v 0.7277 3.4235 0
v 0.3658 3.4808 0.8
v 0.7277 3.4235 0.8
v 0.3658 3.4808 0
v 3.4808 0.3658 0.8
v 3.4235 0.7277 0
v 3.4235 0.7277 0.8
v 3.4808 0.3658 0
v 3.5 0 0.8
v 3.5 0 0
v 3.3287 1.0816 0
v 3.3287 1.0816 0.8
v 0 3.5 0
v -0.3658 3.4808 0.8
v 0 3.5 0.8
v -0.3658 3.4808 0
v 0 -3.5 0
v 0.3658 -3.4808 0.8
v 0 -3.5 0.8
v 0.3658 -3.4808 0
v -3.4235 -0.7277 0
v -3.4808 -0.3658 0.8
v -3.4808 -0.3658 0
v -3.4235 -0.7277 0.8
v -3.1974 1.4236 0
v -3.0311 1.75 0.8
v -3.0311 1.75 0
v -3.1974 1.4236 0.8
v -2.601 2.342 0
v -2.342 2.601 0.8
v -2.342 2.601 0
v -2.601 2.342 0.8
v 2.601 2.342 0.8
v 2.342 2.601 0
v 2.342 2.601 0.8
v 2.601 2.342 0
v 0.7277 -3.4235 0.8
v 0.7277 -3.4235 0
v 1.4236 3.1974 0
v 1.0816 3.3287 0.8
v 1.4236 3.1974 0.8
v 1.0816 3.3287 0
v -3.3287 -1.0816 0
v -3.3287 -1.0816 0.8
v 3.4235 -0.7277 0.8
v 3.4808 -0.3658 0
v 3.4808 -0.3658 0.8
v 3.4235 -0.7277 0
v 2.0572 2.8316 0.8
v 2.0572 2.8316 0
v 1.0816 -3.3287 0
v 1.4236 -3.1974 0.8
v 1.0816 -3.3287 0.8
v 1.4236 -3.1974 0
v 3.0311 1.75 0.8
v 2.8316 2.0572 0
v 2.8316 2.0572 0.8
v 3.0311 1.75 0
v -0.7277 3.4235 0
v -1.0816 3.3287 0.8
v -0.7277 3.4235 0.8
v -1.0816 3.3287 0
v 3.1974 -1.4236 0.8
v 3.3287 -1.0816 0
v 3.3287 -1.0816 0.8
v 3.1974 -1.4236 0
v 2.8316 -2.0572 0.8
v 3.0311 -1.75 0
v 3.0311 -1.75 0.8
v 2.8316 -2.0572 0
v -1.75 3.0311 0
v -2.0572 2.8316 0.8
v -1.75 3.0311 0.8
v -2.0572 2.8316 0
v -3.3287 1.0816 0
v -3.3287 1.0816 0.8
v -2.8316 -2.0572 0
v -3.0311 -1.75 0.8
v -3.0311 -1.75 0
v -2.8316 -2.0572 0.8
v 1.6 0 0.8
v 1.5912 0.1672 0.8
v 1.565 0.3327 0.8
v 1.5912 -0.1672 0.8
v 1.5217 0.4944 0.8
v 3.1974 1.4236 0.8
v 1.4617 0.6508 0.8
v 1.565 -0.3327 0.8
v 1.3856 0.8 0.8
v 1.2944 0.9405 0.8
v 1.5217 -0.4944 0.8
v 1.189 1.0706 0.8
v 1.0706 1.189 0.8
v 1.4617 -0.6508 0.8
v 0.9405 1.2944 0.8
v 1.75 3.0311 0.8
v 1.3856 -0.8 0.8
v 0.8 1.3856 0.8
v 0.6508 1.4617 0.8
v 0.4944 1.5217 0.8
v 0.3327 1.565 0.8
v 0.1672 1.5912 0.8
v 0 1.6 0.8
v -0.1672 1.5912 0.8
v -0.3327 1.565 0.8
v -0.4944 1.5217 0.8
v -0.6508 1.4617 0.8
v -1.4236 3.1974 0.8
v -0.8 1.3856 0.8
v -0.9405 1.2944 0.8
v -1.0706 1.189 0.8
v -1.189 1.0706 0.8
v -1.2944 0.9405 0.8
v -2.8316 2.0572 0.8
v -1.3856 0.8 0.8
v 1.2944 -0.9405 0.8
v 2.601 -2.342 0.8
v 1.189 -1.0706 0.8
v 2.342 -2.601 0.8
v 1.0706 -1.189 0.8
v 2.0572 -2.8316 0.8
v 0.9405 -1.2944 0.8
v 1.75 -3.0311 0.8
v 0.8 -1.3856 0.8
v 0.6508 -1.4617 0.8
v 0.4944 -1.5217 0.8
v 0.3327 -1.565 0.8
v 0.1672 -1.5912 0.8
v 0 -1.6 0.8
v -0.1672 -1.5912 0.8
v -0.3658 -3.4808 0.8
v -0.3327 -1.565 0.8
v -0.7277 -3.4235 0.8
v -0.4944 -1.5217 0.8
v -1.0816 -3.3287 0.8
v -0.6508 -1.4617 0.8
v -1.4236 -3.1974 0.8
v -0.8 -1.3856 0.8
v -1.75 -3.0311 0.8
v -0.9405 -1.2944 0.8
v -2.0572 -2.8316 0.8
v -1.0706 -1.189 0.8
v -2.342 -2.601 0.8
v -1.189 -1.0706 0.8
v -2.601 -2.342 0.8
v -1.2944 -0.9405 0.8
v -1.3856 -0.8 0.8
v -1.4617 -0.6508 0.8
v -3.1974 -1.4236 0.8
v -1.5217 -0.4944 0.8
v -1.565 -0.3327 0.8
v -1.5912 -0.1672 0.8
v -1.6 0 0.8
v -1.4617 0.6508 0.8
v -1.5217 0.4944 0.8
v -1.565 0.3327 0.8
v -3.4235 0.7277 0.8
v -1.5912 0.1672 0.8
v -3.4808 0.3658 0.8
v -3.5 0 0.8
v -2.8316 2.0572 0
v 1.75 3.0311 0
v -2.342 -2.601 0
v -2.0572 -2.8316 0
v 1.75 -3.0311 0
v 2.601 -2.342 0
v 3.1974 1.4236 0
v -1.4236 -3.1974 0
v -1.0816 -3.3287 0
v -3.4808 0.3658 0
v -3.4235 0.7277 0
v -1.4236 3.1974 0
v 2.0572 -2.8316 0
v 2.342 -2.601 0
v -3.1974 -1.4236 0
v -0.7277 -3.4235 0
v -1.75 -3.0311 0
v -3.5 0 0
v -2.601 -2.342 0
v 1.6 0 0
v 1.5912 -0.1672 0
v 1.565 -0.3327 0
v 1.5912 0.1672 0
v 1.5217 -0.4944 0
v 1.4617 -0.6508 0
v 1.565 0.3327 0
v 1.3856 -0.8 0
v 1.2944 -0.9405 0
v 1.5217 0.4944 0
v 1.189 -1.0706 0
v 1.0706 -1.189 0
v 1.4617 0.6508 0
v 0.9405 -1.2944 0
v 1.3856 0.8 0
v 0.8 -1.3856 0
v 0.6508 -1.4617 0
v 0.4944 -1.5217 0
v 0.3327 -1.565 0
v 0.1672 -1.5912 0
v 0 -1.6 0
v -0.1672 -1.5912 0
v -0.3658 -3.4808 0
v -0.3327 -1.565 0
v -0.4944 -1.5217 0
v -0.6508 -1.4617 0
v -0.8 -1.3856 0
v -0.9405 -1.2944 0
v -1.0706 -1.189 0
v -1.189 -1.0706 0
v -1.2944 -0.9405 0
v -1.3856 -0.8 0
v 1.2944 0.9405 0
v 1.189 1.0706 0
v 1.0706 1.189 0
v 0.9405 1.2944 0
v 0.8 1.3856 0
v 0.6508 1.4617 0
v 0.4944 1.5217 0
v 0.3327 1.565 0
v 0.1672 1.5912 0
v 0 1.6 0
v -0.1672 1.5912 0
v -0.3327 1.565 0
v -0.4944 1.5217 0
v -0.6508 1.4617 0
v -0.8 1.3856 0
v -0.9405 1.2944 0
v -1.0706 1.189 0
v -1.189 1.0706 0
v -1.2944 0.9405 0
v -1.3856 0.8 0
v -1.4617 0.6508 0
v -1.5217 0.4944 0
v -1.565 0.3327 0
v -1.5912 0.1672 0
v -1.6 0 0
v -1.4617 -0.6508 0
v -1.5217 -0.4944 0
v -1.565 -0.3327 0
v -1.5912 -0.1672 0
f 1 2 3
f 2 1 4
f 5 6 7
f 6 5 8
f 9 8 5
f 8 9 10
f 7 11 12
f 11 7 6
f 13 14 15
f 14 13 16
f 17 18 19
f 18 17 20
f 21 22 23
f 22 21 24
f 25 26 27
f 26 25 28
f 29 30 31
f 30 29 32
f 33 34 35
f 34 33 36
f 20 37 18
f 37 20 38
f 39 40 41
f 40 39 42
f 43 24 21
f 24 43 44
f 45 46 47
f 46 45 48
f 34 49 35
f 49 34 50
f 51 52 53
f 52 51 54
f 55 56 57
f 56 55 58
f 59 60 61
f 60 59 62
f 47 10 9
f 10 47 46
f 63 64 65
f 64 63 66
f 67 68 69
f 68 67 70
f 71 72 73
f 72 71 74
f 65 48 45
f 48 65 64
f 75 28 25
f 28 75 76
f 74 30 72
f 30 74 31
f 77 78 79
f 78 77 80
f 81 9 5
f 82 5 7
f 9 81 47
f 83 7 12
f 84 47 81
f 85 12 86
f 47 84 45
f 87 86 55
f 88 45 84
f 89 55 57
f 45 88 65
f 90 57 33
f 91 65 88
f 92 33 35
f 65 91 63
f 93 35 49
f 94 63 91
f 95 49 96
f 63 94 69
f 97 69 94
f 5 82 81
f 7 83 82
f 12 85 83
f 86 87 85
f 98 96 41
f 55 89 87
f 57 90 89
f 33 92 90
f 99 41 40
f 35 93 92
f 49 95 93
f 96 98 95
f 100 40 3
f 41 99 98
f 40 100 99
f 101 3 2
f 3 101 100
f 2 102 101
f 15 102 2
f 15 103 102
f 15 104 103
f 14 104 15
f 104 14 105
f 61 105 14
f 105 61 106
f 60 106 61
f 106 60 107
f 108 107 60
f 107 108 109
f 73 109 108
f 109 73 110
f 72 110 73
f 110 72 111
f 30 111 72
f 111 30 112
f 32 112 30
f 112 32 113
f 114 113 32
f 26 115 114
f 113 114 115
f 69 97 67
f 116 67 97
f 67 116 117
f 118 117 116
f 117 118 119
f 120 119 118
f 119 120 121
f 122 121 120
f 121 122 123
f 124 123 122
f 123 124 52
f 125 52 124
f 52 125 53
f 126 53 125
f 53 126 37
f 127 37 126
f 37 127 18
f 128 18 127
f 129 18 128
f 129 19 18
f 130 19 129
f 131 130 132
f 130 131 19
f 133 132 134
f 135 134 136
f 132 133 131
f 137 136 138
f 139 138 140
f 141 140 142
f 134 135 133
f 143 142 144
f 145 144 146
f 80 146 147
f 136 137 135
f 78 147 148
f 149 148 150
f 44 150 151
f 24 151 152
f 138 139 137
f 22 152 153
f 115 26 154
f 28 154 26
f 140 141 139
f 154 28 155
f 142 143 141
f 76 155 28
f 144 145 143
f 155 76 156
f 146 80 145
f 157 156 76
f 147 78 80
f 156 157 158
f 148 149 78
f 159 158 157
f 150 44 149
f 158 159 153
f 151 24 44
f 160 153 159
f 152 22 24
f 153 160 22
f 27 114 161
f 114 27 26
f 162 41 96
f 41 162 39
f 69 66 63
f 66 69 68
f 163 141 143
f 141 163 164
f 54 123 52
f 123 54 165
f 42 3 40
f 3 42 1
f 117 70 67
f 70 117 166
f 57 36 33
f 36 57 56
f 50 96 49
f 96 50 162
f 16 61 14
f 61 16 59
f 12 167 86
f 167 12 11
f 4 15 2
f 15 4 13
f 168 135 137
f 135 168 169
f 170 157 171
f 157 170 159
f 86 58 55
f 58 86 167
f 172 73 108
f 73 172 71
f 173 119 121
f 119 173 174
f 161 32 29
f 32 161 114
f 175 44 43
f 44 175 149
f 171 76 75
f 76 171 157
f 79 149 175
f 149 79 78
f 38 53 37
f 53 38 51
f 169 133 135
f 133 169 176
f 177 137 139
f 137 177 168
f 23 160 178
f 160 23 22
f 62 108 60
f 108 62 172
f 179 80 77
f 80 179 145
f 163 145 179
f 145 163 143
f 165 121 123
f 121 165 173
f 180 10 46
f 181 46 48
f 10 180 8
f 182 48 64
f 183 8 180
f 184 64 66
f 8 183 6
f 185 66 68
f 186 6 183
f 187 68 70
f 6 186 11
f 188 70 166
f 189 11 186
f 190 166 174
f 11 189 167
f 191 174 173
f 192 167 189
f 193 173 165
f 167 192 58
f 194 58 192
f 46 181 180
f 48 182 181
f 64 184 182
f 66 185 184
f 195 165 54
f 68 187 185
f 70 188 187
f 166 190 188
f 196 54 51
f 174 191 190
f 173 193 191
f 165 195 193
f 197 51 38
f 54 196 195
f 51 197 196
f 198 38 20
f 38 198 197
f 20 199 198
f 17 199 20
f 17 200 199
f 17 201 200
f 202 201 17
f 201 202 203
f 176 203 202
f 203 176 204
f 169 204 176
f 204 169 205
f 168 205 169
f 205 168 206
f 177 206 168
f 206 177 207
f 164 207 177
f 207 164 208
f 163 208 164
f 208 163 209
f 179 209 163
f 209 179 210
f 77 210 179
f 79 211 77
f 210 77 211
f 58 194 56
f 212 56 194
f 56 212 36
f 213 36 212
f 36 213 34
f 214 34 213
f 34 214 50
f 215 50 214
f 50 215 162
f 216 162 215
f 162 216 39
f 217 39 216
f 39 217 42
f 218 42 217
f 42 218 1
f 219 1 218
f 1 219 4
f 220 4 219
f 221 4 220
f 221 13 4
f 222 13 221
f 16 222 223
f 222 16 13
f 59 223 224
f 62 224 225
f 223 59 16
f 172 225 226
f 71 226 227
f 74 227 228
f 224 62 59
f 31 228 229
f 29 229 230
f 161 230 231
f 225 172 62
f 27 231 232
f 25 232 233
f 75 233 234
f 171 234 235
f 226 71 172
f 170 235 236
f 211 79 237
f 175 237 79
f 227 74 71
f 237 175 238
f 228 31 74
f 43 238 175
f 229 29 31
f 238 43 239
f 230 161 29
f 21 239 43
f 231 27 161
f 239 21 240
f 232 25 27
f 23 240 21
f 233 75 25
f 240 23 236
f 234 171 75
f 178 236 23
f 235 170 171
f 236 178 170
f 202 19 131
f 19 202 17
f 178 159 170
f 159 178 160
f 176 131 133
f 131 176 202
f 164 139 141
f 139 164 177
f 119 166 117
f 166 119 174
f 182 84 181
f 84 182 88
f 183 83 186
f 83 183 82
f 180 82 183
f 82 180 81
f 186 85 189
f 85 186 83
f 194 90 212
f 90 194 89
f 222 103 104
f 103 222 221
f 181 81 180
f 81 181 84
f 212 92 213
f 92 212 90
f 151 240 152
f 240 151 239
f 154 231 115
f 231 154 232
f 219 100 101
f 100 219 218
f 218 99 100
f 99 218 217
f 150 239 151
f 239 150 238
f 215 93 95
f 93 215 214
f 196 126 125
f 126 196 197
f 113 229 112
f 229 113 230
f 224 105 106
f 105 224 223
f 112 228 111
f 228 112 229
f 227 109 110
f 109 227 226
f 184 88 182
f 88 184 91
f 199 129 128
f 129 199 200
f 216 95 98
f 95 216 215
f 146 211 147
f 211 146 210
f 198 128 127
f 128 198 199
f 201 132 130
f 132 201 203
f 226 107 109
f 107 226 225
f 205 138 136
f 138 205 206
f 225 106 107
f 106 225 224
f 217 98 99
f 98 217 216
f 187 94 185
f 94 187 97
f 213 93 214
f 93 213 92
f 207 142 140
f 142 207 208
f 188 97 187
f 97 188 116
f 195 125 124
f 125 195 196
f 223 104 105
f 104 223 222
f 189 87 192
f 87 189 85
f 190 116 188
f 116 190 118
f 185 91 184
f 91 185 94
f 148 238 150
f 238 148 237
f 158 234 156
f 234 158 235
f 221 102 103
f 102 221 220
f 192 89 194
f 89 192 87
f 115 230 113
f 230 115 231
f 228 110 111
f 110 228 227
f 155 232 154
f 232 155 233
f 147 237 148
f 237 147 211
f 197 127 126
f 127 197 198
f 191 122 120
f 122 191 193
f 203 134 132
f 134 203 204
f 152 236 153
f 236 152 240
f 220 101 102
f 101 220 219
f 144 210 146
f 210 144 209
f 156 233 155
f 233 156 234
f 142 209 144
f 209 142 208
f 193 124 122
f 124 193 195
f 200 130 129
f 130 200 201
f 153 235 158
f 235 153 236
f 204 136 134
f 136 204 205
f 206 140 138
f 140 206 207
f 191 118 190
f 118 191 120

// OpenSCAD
// Flat metric washer.
$fn = 60;
eps = 0.02;
inner_d = 3.2;
outer_d = 7;
thickness = 0.8;
difference() {
    cylinder(d = outer_d, h = thickness);
    translate([0, 0, -eps]) cylinder(d = inner_d, h = thickness + 2 * eps);
}
